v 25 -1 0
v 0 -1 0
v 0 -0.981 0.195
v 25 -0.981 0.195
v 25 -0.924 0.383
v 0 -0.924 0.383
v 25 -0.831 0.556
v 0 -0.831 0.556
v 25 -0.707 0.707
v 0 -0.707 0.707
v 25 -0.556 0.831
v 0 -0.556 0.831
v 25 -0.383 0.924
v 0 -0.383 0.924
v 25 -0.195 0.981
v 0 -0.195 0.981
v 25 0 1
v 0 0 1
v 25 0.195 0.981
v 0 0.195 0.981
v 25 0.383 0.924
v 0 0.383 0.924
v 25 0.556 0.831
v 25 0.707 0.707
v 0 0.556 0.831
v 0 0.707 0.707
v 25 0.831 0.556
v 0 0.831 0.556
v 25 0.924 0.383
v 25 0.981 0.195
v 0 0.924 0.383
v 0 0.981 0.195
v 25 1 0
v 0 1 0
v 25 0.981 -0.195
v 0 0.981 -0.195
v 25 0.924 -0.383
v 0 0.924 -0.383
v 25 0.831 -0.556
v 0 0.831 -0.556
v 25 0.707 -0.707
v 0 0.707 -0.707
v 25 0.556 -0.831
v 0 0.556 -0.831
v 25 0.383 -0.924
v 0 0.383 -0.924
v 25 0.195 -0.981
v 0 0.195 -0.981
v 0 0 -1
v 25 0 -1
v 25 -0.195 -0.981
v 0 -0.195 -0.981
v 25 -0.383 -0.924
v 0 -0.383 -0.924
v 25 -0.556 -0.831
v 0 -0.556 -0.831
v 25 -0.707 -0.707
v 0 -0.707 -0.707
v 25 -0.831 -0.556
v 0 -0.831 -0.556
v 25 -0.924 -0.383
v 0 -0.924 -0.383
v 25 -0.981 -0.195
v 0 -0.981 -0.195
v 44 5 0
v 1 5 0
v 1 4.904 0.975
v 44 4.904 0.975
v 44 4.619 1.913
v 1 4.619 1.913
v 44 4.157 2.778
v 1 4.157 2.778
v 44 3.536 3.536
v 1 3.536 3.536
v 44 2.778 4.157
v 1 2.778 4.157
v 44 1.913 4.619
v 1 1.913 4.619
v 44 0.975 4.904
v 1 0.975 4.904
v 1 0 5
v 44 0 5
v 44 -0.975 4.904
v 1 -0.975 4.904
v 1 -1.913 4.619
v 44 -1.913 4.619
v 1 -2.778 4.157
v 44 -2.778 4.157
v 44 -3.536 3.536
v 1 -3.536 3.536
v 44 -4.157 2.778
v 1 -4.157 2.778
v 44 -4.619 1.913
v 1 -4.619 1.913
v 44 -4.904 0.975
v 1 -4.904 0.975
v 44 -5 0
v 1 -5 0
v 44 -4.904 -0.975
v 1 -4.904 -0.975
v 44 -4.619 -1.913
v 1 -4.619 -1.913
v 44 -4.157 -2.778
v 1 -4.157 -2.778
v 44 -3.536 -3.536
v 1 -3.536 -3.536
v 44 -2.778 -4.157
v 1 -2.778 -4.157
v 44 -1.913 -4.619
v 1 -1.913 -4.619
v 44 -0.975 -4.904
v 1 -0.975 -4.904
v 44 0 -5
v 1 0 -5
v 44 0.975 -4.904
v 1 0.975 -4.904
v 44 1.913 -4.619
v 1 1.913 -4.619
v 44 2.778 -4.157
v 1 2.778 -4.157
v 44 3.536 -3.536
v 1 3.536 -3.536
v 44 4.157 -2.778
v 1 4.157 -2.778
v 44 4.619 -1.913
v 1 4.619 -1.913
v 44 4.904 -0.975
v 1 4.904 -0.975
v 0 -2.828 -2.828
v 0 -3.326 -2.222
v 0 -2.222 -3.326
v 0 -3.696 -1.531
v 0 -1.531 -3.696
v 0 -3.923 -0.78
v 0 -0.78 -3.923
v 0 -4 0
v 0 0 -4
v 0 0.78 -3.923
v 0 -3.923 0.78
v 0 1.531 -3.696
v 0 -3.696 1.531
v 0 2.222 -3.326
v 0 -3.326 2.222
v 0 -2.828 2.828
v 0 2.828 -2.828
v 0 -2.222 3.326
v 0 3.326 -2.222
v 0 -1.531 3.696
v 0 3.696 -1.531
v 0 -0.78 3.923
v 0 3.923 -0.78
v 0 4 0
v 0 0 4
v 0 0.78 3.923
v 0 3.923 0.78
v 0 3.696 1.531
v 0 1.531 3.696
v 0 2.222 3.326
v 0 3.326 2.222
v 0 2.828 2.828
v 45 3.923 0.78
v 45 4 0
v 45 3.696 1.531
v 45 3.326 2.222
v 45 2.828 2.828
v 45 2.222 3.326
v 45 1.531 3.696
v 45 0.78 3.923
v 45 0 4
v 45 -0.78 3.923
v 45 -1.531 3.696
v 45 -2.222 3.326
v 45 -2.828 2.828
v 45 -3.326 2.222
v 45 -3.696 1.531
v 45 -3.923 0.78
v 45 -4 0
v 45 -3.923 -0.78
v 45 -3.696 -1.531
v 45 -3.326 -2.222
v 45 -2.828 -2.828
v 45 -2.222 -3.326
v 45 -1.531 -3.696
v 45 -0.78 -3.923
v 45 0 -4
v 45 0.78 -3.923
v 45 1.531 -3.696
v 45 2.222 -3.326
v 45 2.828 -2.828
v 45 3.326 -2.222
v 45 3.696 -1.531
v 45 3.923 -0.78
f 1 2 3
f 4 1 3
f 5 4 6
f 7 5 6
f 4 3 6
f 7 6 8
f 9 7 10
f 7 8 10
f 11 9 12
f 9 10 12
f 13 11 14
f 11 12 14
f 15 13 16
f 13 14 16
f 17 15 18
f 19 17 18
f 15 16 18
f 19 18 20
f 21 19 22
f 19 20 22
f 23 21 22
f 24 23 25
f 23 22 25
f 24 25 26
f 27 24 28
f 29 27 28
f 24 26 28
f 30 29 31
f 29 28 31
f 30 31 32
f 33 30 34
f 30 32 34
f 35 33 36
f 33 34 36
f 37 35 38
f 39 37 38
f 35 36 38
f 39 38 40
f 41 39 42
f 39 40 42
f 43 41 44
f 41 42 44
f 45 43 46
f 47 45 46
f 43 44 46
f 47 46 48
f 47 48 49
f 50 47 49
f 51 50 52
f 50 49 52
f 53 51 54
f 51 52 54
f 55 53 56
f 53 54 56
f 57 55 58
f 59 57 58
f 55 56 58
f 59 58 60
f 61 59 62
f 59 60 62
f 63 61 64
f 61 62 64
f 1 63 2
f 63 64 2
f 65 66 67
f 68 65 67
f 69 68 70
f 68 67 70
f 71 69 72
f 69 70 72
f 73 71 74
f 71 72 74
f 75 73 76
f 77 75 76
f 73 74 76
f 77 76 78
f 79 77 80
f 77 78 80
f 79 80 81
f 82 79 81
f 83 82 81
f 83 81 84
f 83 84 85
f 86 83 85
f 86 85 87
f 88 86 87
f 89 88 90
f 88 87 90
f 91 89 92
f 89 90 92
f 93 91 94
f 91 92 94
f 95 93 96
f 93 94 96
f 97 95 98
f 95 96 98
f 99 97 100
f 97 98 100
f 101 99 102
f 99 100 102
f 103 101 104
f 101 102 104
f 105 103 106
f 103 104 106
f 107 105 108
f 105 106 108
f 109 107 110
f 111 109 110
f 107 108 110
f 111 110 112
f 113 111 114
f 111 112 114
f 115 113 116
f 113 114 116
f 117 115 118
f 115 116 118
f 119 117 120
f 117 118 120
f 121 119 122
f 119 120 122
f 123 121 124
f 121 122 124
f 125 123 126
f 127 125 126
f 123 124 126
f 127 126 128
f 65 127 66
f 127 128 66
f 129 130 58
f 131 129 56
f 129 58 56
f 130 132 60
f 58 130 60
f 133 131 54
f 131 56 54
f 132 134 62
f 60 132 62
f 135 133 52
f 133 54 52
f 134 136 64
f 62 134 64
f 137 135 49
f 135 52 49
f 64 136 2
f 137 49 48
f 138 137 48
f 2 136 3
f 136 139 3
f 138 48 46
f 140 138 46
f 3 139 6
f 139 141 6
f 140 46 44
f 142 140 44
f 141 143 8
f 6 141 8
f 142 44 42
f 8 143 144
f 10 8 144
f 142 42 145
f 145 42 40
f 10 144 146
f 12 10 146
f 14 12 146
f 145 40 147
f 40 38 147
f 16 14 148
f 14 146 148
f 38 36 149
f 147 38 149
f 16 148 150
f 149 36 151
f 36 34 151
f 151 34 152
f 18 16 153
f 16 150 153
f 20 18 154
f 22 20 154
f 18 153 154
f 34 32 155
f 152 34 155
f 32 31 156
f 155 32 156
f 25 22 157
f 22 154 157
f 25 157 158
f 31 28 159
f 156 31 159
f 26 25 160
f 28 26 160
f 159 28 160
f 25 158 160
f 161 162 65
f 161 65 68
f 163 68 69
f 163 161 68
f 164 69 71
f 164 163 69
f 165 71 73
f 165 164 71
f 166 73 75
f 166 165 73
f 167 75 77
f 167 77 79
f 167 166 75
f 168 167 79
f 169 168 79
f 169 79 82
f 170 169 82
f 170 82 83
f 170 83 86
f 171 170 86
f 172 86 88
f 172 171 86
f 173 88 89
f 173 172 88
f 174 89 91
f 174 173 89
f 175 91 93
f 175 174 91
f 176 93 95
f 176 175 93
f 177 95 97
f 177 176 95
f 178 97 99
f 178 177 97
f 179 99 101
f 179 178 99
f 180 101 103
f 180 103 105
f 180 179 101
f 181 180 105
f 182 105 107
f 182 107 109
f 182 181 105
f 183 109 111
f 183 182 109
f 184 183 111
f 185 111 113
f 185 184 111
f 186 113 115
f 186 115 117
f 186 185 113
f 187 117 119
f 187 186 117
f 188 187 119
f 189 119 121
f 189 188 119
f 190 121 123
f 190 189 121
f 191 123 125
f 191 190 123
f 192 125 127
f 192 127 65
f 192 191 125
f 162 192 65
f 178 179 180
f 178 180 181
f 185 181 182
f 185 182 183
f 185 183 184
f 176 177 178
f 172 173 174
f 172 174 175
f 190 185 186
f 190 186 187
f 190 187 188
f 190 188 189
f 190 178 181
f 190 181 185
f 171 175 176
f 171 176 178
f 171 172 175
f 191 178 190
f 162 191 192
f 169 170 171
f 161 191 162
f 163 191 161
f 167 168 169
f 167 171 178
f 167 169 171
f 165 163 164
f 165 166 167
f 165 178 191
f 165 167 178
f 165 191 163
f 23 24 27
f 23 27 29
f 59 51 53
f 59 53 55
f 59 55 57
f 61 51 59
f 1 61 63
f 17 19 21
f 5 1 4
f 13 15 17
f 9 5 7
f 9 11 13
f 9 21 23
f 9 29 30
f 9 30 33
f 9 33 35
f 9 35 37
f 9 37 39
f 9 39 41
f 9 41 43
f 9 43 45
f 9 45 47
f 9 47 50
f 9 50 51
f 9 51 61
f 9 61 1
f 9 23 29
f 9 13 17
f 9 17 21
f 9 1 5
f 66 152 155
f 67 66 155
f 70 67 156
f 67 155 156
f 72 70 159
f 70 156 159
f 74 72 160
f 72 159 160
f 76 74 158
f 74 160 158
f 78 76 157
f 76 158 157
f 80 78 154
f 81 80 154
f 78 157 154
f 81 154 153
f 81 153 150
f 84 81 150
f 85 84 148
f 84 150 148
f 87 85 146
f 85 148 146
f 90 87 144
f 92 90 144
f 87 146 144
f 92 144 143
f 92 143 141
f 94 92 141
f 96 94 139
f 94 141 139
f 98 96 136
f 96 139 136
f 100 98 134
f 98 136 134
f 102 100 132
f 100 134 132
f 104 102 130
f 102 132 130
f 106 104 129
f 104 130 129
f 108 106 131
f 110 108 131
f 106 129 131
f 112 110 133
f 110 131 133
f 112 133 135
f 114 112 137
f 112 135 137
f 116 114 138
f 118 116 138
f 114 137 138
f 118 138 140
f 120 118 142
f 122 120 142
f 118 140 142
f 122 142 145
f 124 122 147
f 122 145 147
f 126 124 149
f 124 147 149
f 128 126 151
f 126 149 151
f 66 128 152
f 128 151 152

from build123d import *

# Parameters (mm, degrees)
F0_R     = 5
F1_DEPTH = 45
F2_R     = 1
F3_DEPTH = 25
F4_SIZE  = 1


with BuildPart() as f1:
    # F0 (on Right) → F1 (new body)
    with BuildSketch(Plane.YZ):
        Circle(F0_R)
    extrude(amount=F1_DEPTH)

    # F2 (on face) → F3 (cut)
    with BuildSketch(Plane(origin=(0, 0, 0), x_dir=(0, -1, 0), z_dir=(-1, 0, 0))):
        Circle(F2_R)
    extrude(amount=-F3_DEPTH, mode=Mode.SUBTRACT)

    # F4
    f4_edges = [f1.edges().sort_by_distance(p)[0] for p in [
        (0, -5, 0),
        (45, -5, 0),
    ]]
    chamfer(f4_edges, length=F4_SIZE)


solid = f1.part
